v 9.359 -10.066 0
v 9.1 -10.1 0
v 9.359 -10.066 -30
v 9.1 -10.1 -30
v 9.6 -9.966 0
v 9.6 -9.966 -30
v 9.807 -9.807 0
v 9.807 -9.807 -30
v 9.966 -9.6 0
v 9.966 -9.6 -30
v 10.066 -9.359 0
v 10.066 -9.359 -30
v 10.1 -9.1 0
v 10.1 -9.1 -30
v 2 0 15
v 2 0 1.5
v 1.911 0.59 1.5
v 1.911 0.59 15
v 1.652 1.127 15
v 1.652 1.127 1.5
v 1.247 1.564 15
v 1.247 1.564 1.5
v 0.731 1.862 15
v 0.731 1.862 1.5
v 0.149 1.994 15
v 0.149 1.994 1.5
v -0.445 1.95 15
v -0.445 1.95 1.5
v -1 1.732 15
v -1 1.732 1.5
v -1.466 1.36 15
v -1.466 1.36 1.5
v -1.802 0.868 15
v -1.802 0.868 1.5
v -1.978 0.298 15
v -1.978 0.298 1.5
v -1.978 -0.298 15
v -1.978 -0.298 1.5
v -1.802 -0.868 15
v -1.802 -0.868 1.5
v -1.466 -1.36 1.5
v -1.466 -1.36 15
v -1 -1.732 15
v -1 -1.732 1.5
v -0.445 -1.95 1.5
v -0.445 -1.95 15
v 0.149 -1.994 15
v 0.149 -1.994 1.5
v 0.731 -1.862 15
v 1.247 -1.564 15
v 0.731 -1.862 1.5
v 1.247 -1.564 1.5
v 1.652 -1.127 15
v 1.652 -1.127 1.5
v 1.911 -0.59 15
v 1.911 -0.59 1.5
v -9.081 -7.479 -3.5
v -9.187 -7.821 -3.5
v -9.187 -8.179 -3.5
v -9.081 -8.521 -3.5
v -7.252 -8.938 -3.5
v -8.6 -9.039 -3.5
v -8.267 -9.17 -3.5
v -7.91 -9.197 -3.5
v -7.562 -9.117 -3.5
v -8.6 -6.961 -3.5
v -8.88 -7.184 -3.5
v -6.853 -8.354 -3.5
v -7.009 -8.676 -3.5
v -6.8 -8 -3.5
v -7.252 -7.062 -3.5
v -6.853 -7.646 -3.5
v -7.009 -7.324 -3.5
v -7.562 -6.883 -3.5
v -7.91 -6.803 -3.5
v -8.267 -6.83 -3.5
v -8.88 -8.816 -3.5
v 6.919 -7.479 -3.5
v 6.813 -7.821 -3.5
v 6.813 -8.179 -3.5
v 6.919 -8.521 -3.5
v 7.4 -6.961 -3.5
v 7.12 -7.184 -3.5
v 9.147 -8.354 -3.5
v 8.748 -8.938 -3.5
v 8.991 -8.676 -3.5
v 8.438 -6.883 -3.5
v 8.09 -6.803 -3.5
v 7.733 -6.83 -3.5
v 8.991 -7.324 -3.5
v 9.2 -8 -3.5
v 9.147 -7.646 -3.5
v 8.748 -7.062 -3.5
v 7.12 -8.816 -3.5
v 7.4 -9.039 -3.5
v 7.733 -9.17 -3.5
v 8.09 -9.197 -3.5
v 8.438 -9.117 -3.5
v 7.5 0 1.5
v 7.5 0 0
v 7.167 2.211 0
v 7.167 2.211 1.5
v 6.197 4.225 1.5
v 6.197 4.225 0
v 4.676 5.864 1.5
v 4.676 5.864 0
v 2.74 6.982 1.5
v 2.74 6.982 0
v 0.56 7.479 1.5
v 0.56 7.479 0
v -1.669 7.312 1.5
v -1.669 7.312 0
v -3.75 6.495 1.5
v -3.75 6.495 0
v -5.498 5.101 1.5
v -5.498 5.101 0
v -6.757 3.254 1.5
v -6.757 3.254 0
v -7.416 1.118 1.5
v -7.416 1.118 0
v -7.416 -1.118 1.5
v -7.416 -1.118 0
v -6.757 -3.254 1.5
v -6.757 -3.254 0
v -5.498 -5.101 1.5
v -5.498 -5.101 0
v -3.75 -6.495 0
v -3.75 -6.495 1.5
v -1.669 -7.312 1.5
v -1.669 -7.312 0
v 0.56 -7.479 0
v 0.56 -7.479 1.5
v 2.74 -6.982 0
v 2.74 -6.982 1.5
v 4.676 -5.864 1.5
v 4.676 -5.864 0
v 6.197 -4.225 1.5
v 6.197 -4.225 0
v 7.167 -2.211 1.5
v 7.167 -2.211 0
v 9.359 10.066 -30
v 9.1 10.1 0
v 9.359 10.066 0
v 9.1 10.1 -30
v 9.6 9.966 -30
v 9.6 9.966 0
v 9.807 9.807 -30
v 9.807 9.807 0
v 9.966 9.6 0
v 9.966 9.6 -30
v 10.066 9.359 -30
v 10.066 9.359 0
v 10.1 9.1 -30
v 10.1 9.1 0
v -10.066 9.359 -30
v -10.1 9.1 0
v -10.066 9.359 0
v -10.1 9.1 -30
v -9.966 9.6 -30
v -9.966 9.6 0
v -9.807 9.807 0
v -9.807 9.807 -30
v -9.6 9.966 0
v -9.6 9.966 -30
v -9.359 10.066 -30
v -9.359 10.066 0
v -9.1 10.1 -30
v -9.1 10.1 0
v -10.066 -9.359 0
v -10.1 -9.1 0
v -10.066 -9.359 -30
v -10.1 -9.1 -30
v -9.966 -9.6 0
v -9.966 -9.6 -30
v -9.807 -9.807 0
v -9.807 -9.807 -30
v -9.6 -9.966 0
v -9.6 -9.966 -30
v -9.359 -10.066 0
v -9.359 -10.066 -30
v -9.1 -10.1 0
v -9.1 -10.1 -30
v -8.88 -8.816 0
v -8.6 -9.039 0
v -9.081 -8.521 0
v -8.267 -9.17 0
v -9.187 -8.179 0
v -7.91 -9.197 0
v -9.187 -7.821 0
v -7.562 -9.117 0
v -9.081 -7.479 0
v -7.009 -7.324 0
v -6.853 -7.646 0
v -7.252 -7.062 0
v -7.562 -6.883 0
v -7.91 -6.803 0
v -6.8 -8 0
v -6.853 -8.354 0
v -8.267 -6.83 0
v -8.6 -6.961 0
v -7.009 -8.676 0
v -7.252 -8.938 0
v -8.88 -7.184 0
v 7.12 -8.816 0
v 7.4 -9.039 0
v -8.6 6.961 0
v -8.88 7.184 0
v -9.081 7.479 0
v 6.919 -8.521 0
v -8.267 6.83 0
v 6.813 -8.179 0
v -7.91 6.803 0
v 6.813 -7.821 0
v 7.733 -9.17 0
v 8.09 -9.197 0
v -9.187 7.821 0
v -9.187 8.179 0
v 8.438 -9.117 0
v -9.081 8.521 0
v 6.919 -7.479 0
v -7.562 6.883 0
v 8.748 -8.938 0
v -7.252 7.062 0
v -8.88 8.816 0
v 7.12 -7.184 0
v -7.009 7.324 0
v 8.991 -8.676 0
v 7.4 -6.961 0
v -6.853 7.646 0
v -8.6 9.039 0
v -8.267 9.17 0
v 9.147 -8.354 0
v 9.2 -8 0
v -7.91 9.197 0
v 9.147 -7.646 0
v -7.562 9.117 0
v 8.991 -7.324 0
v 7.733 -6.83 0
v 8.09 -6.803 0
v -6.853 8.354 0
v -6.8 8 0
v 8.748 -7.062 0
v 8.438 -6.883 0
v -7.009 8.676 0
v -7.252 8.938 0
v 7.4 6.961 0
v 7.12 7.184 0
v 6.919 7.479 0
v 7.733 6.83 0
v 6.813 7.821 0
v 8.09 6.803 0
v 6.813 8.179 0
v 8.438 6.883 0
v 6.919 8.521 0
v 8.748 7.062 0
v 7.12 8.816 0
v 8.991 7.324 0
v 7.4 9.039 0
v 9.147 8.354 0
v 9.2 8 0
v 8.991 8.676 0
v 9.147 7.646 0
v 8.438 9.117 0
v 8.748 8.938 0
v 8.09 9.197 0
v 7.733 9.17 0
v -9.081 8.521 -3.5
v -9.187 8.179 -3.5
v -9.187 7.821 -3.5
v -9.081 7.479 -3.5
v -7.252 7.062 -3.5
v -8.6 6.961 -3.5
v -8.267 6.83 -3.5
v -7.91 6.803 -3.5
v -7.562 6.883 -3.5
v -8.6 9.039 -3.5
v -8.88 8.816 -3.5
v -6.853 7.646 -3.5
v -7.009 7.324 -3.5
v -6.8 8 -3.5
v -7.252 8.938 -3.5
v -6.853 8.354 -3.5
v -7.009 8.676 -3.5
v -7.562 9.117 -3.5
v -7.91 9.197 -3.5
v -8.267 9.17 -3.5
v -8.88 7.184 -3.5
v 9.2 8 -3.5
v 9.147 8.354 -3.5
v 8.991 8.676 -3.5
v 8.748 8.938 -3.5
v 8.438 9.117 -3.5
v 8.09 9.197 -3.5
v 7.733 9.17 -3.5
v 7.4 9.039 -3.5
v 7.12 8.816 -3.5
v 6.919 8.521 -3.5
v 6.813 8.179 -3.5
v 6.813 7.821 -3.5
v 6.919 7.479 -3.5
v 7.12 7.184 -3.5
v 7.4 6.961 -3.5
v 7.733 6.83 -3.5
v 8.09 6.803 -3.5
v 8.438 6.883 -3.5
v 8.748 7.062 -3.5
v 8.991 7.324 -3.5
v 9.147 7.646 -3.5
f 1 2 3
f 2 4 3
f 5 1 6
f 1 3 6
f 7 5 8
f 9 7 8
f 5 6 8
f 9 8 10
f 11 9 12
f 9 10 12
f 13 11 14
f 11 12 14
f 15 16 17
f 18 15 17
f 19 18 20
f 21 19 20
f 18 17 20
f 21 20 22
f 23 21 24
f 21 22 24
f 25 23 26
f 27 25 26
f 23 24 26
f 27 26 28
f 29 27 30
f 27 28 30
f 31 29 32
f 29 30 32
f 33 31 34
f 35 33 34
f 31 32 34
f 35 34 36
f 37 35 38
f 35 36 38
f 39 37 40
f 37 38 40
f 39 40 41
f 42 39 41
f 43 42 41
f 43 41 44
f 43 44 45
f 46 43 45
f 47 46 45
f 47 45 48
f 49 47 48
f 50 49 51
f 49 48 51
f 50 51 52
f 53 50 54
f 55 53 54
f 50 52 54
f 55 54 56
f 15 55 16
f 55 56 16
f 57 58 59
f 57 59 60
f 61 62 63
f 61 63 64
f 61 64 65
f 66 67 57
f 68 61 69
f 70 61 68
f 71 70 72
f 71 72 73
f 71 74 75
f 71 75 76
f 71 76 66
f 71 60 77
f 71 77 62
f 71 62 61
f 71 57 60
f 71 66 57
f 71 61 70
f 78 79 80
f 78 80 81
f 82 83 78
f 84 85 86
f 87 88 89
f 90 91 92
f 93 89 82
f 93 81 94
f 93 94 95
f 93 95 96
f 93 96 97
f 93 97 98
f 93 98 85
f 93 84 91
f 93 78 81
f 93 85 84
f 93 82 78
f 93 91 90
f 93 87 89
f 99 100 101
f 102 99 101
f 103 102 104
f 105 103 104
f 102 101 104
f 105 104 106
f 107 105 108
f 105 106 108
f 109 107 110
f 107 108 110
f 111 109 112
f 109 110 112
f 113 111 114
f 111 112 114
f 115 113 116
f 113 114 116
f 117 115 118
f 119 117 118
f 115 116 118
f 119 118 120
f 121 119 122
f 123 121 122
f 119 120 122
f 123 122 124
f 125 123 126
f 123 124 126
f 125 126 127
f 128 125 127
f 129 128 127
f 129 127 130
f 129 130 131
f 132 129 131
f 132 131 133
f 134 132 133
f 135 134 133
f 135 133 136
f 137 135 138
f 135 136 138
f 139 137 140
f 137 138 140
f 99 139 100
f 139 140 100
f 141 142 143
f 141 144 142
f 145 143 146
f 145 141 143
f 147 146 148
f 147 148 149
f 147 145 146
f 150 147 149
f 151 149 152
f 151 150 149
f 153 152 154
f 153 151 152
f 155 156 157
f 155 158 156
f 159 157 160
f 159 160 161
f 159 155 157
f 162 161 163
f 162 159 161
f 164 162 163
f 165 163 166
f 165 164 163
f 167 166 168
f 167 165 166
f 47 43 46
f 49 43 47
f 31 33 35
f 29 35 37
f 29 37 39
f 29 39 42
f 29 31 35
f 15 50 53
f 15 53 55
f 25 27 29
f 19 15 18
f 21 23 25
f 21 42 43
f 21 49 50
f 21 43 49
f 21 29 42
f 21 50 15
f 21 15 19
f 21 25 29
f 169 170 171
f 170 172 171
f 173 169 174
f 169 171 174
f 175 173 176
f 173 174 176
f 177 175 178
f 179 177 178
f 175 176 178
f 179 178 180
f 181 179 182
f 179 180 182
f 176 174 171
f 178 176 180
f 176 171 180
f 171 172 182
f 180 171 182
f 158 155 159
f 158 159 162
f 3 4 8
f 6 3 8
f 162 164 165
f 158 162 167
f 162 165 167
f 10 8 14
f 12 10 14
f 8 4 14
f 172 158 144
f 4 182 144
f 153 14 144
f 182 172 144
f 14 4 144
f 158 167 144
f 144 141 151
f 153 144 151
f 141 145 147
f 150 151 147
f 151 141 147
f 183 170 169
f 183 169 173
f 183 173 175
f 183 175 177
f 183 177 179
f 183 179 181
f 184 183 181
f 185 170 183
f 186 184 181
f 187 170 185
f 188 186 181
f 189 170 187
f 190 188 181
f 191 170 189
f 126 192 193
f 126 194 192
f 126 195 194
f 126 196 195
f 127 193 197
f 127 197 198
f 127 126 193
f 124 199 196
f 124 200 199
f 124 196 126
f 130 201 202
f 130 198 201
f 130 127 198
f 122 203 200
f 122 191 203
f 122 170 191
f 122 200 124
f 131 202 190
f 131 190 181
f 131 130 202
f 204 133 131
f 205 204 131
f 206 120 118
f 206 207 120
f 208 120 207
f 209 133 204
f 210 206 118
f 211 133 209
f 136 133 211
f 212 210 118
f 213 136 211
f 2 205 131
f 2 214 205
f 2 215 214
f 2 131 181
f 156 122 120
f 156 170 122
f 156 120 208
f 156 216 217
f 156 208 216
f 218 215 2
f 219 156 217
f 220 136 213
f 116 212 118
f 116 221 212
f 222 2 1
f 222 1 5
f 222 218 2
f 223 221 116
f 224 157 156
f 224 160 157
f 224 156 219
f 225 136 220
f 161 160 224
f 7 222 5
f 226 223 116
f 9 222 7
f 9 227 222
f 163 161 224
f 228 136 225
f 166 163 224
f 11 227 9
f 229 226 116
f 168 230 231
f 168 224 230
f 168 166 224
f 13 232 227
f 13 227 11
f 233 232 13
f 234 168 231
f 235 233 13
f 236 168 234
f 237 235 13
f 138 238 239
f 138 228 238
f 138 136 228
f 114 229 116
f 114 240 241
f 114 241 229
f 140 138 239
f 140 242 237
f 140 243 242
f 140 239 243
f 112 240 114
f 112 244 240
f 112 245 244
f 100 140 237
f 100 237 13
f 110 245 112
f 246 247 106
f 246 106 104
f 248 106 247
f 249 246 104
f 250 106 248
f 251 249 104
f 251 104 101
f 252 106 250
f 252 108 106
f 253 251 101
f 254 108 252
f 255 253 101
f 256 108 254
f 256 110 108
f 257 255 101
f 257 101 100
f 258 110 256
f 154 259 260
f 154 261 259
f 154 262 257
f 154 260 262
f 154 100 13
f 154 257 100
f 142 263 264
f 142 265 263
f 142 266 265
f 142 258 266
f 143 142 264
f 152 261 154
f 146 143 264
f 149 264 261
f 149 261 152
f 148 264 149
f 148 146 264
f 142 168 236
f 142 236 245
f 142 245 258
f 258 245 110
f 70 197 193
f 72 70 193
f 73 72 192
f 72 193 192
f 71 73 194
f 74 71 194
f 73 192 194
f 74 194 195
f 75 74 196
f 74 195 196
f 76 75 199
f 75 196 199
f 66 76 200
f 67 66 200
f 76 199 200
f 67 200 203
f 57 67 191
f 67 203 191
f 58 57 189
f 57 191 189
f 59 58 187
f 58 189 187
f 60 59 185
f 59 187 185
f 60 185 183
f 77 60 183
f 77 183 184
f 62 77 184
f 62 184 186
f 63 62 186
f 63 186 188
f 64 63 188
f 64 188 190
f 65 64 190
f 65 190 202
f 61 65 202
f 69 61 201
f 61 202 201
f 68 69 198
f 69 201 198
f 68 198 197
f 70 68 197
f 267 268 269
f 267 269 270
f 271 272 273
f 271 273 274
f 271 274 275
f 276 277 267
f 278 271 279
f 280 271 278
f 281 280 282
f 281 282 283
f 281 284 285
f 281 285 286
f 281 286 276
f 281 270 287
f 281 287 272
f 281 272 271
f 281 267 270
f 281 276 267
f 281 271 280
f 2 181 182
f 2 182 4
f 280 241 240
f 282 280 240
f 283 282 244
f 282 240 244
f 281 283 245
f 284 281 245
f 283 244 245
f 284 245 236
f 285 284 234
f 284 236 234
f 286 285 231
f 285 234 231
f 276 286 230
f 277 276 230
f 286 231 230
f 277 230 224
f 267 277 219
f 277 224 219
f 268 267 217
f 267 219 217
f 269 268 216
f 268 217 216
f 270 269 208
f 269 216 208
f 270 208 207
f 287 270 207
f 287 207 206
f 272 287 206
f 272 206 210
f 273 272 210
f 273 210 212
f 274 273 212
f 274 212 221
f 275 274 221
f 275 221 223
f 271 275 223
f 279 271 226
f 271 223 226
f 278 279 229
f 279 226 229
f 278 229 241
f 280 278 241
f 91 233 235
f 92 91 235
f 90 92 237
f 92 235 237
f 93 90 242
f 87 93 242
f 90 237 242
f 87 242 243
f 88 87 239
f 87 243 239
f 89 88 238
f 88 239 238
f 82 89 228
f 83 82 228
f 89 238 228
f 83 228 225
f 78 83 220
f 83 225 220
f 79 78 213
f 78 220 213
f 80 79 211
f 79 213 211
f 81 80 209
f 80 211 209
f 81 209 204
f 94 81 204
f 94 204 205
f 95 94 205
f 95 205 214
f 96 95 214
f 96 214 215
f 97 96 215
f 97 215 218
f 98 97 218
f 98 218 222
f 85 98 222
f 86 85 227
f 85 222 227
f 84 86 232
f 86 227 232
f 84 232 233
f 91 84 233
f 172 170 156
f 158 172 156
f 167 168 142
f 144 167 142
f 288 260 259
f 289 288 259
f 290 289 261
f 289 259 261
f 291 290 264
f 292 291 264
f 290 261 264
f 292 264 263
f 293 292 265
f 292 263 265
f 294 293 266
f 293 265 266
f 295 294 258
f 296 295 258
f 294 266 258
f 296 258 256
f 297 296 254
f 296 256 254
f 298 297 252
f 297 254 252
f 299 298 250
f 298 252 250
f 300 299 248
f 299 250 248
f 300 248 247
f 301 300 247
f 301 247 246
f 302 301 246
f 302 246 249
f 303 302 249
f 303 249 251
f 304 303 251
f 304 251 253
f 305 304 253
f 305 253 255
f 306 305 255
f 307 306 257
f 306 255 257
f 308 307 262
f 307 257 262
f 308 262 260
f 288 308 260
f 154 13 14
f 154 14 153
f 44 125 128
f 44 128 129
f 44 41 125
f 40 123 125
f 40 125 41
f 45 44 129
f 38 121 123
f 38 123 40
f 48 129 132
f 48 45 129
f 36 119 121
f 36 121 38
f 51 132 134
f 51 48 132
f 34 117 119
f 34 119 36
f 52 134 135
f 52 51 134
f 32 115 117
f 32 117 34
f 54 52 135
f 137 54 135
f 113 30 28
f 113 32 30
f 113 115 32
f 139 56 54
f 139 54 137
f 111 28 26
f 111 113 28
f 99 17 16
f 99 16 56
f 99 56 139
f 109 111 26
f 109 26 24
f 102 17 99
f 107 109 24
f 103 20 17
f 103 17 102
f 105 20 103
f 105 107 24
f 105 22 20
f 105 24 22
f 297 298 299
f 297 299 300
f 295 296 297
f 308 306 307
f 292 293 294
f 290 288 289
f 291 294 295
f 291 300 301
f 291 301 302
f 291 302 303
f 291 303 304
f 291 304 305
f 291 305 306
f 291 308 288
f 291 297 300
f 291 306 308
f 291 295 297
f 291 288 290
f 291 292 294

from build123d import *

# Parameters (mm, degrees)
ESQUISSE1_W             = 20.2
ESQUISSE1_H             = 20.2
BOSS_EXTRU_1_DEPTH      = 30
ESQUISSE2_R             = 7.5
BOSS_EXTRU_2_DEPTH      = 1.5
ESQUISSE3_R             = 2
BOSS_EXTRU_4_DEPTH      = 13.5
ESQUISSE4_R             = 1.2
ENL_V_MAT_EXTRU_1_DEPTH = 3.5
CONG_1_R                = 1


with BuildPart() as part:
    # Esquisse1 → Boss.-Extru.1 (new body)
    with BuildSketch(Plane.XY):
        Rectangle(ESQUISSE1_W, ESQUISSE1_H)
    extrude(amount=-BOSS_EXTRU_1_DEPTH)

    # Esquisse2 → Boss.-Extru.2 (add)
    with BuildSketch(Plane.XY):
        Circle(ESQUISSE2_R)
    extrude(amount=BOSS_EXTRU_2_DEPTH)

    # Esquisse3 → Boss.-Extru.4 (add)
    with BuildSketch(Plane.XY.offset(1.5)):
        Circle(ESQUISSE3_R)
    extrude(amount=BOSS_EXTRU_4_DEPTH)

    # Esquisse4 → Enlèv. mat.-Extru.1 (cut)
    with BuildSketch(Plane.XY):
        with Locations((-8, 8)):
            Circle(ESQUISSE4_R)
        with Locations((8, 8)):
            Circle(ESQUISSE4_R)
        with Locations((8, -8)):
            Circle(ESQUISSE4_R)
        with Locations((-8, -8)):
            Circle(ESQUISSE4_R)
    extrude(amount=-ENL_V_MAT_EXTRU_1_DEPTH, mode=Mode.SUBTRACT)

    # Congé1
    cong_1_edges = [part.edges().sort_by_distance(p)[0] for p in [
        (-10.1, 10.1, -15),
        (10.1, 10.1, -15),
        (10.1, -10.1, -15),
        (-10.1, -10.1, -15),
    ]]
    fillet(cong_1_edges, radius=CONG_1_R)


solid = part.part
